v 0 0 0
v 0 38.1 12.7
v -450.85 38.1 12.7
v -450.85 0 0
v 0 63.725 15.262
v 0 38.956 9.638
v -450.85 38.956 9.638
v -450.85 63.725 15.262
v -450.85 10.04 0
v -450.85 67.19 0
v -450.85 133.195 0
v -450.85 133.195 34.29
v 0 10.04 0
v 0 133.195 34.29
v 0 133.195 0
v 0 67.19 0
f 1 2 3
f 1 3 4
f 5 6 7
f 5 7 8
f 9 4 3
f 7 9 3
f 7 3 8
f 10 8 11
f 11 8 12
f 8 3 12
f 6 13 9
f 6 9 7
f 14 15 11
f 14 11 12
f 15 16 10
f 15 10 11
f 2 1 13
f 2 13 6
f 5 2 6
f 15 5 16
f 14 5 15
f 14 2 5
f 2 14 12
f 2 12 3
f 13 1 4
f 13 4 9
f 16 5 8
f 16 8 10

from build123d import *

# Parameters (mm, degrees)
F1_DEPTH = 450.85


with BuildPart() as f1:
    # F0 (on Right) → F1 (new body)
    with BuildSketch(Plane.YZ):
        Polygon((133.195122, 31.0342), (63.725202, 15.262039), (67.190232, 0), (133.195122, 0), align=None)
        Polygon((38.1, 12.7), (0, 0), (10.040232, 0), (38.95556, 9.638443), (63.725202, 15.262039), (133.195122, 31.0342), (133.195122, 34.29), align=None)
    extrude(amount=-F1_DEPTH)


solid = f1.part
